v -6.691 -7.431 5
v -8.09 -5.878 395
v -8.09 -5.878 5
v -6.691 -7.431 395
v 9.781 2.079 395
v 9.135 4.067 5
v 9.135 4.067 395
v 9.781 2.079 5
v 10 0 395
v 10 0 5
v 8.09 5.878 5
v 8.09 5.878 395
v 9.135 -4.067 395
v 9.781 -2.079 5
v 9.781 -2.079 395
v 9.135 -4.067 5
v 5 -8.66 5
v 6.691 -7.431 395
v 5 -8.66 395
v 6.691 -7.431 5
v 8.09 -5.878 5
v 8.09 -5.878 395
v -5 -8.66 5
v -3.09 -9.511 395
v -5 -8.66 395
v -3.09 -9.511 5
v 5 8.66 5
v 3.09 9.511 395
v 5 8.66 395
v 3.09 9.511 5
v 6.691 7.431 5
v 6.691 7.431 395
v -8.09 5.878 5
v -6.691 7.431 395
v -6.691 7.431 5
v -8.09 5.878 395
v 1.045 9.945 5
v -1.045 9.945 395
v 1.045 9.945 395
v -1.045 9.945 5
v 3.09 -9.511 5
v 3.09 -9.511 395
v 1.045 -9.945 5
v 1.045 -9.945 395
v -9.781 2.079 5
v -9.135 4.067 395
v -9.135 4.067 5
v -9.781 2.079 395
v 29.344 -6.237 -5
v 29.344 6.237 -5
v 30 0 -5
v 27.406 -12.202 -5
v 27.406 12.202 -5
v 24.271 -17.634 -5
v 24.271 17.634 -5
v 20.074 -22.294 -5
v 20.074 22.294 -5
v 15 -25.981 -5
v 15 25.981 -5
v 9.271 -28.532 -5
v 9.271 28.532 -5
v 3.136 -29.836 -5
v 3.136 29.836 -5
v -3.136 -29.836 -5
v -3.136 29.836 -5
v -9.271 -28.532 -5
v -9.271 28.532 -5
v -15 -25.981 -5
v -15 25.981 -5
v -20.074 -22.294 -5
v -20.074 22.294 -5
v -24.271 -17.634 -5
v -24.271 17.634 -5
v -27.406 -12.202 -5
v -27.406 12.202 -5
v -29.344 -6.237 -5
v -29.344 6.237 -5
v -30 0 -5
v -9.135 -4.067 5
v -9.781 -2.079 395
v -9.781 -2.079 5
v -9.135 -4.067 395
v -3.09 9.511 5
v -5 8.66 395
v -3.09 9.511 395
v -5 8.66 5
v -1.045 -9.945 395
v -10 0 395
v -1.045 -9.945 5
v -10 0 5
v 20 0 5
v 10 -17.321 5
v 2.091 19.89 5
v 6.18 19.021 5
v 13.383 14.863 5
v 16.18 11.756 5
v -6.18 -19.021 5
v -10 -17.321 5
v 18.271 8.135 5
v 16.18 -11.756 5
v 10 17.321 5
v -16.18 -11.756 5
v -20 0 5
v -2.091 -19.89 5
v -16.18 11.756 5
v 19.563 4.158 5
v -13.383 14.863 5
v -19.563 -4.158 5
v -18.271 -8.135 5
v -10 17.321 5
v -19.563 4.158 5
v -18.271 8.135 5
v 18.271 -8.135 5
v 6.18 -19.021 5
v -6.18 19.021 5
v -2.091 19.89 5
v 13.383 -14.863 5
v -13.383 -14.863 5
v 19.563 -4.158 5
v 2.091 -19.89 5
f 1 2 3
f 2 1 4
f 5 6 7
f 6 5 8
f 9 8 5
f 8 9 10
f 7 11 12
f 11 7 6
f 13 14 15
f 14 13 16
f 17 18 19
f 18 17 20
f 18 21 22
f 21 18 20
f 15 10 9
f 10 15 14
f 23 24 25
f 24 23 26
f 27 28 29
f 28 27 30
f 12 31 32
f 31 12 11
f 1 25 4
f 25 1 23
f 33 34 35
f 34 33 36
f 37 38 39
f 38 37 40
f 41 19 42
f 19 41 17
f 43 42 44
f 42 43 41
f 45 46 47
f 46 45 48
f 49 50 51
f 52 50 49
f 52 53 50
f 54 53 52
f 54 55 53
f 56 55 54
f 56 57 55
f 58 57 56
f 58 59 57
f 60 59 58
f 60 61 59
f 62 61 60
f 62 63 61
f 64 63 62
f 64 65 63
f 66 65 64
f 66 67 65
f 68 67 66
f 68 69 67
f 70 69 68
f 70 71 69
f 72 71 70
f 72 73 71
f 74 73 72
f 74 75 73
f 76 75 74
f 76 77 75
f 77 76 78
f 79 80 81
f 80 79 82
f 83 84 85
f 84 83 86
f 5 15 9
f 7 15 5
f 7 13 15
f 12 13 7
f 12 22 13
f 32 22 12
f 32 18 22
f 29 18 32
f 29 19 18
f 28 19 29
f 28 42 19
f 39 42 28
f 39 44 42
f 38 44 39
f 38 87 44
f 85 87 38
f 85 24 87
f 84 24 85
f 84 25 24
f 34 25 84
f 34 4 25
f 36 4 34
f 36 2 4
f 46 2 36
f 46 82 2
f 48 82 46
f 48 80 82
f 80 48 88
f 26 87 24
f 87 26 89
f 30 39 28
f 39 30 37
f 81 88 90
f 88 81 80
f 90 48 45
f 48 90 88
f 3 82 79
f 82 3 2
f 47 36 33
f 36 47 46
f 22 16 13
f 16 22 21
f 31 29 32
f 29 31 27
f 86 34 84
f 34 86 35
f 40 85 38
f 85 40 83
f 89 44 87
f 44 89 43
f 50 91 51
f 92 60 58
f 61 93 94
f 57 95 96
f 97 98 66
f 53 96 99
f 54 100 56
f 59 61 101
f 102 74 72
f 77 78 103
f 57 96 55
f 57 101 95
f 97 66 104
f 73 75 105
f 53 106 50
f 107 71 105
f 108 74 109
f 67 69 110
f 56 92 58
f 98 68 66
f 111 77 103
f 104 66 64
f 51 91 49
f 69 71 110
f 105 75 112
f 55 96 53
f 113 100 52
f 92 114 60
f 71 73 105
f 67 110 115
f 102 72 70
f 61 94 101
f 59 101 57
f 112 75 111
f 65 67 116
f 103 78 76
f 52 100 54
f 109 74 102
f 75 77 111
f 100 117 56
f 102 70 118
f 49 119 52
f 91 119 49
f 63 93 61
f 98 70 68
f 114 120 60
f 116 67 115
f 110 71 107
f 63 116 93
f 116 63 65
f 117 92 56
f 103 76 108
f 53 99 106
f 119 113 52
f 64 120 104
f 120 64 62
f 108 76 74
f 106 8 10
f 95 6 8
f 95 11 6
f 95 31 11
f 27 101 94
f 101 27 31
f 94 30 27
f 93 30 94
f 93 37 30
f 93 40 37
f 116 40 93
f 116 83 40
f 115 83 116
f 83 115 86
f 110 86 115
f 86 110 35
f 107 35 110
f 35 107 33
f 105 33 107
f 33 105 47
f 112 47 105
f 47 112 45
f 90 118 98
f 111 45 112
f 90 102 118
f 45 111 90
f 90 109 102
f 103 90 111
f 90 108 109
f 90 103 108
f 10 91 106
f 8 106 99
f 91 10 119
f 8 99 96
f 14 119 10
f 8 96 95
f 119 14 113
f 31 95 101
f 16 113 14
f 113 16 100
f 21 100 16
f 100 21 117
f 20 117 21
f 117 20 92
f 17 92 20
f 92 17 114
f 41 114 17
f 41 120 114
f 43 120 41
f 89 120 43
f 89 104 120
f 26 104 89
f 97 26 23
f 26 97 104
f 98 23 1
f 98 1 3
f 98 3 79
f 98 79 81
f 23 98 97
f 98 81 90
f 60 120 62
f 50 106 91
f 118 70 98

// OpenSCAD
//
//  Copyright (C) 15-2-2013 Jasper den Ouden.
//
//  This is free software: you can redistribute it and/or modify
//  it under the terms of the GNU General Public License as published
//  by the Free Software Foundation, either version 3 of the License, or
//  (at your option) any later version.
//

module substract_hole(d,hole_r, head_r,head_d,head_dr,head_dz)
{   translate([0,0,-head_d])
    { cylinder(r= hole_r, h = 4*d);
      cylinder(r= head_r, h= head_d);
      cylinder(r1= head_r + head_dr*2*head_dz/head_dz, r2=head_r, 
               h= 2*head_dz);
    }
}

hole_r = 10;
head_r = 20; //Radius of screw(or whatever) head.
head_d = 5; //Depth of embedding.
head_dr = 5;
head_dz = 5;
substract_hole(100,hole_r, head_r,head_d,head_dr,head_dz);
